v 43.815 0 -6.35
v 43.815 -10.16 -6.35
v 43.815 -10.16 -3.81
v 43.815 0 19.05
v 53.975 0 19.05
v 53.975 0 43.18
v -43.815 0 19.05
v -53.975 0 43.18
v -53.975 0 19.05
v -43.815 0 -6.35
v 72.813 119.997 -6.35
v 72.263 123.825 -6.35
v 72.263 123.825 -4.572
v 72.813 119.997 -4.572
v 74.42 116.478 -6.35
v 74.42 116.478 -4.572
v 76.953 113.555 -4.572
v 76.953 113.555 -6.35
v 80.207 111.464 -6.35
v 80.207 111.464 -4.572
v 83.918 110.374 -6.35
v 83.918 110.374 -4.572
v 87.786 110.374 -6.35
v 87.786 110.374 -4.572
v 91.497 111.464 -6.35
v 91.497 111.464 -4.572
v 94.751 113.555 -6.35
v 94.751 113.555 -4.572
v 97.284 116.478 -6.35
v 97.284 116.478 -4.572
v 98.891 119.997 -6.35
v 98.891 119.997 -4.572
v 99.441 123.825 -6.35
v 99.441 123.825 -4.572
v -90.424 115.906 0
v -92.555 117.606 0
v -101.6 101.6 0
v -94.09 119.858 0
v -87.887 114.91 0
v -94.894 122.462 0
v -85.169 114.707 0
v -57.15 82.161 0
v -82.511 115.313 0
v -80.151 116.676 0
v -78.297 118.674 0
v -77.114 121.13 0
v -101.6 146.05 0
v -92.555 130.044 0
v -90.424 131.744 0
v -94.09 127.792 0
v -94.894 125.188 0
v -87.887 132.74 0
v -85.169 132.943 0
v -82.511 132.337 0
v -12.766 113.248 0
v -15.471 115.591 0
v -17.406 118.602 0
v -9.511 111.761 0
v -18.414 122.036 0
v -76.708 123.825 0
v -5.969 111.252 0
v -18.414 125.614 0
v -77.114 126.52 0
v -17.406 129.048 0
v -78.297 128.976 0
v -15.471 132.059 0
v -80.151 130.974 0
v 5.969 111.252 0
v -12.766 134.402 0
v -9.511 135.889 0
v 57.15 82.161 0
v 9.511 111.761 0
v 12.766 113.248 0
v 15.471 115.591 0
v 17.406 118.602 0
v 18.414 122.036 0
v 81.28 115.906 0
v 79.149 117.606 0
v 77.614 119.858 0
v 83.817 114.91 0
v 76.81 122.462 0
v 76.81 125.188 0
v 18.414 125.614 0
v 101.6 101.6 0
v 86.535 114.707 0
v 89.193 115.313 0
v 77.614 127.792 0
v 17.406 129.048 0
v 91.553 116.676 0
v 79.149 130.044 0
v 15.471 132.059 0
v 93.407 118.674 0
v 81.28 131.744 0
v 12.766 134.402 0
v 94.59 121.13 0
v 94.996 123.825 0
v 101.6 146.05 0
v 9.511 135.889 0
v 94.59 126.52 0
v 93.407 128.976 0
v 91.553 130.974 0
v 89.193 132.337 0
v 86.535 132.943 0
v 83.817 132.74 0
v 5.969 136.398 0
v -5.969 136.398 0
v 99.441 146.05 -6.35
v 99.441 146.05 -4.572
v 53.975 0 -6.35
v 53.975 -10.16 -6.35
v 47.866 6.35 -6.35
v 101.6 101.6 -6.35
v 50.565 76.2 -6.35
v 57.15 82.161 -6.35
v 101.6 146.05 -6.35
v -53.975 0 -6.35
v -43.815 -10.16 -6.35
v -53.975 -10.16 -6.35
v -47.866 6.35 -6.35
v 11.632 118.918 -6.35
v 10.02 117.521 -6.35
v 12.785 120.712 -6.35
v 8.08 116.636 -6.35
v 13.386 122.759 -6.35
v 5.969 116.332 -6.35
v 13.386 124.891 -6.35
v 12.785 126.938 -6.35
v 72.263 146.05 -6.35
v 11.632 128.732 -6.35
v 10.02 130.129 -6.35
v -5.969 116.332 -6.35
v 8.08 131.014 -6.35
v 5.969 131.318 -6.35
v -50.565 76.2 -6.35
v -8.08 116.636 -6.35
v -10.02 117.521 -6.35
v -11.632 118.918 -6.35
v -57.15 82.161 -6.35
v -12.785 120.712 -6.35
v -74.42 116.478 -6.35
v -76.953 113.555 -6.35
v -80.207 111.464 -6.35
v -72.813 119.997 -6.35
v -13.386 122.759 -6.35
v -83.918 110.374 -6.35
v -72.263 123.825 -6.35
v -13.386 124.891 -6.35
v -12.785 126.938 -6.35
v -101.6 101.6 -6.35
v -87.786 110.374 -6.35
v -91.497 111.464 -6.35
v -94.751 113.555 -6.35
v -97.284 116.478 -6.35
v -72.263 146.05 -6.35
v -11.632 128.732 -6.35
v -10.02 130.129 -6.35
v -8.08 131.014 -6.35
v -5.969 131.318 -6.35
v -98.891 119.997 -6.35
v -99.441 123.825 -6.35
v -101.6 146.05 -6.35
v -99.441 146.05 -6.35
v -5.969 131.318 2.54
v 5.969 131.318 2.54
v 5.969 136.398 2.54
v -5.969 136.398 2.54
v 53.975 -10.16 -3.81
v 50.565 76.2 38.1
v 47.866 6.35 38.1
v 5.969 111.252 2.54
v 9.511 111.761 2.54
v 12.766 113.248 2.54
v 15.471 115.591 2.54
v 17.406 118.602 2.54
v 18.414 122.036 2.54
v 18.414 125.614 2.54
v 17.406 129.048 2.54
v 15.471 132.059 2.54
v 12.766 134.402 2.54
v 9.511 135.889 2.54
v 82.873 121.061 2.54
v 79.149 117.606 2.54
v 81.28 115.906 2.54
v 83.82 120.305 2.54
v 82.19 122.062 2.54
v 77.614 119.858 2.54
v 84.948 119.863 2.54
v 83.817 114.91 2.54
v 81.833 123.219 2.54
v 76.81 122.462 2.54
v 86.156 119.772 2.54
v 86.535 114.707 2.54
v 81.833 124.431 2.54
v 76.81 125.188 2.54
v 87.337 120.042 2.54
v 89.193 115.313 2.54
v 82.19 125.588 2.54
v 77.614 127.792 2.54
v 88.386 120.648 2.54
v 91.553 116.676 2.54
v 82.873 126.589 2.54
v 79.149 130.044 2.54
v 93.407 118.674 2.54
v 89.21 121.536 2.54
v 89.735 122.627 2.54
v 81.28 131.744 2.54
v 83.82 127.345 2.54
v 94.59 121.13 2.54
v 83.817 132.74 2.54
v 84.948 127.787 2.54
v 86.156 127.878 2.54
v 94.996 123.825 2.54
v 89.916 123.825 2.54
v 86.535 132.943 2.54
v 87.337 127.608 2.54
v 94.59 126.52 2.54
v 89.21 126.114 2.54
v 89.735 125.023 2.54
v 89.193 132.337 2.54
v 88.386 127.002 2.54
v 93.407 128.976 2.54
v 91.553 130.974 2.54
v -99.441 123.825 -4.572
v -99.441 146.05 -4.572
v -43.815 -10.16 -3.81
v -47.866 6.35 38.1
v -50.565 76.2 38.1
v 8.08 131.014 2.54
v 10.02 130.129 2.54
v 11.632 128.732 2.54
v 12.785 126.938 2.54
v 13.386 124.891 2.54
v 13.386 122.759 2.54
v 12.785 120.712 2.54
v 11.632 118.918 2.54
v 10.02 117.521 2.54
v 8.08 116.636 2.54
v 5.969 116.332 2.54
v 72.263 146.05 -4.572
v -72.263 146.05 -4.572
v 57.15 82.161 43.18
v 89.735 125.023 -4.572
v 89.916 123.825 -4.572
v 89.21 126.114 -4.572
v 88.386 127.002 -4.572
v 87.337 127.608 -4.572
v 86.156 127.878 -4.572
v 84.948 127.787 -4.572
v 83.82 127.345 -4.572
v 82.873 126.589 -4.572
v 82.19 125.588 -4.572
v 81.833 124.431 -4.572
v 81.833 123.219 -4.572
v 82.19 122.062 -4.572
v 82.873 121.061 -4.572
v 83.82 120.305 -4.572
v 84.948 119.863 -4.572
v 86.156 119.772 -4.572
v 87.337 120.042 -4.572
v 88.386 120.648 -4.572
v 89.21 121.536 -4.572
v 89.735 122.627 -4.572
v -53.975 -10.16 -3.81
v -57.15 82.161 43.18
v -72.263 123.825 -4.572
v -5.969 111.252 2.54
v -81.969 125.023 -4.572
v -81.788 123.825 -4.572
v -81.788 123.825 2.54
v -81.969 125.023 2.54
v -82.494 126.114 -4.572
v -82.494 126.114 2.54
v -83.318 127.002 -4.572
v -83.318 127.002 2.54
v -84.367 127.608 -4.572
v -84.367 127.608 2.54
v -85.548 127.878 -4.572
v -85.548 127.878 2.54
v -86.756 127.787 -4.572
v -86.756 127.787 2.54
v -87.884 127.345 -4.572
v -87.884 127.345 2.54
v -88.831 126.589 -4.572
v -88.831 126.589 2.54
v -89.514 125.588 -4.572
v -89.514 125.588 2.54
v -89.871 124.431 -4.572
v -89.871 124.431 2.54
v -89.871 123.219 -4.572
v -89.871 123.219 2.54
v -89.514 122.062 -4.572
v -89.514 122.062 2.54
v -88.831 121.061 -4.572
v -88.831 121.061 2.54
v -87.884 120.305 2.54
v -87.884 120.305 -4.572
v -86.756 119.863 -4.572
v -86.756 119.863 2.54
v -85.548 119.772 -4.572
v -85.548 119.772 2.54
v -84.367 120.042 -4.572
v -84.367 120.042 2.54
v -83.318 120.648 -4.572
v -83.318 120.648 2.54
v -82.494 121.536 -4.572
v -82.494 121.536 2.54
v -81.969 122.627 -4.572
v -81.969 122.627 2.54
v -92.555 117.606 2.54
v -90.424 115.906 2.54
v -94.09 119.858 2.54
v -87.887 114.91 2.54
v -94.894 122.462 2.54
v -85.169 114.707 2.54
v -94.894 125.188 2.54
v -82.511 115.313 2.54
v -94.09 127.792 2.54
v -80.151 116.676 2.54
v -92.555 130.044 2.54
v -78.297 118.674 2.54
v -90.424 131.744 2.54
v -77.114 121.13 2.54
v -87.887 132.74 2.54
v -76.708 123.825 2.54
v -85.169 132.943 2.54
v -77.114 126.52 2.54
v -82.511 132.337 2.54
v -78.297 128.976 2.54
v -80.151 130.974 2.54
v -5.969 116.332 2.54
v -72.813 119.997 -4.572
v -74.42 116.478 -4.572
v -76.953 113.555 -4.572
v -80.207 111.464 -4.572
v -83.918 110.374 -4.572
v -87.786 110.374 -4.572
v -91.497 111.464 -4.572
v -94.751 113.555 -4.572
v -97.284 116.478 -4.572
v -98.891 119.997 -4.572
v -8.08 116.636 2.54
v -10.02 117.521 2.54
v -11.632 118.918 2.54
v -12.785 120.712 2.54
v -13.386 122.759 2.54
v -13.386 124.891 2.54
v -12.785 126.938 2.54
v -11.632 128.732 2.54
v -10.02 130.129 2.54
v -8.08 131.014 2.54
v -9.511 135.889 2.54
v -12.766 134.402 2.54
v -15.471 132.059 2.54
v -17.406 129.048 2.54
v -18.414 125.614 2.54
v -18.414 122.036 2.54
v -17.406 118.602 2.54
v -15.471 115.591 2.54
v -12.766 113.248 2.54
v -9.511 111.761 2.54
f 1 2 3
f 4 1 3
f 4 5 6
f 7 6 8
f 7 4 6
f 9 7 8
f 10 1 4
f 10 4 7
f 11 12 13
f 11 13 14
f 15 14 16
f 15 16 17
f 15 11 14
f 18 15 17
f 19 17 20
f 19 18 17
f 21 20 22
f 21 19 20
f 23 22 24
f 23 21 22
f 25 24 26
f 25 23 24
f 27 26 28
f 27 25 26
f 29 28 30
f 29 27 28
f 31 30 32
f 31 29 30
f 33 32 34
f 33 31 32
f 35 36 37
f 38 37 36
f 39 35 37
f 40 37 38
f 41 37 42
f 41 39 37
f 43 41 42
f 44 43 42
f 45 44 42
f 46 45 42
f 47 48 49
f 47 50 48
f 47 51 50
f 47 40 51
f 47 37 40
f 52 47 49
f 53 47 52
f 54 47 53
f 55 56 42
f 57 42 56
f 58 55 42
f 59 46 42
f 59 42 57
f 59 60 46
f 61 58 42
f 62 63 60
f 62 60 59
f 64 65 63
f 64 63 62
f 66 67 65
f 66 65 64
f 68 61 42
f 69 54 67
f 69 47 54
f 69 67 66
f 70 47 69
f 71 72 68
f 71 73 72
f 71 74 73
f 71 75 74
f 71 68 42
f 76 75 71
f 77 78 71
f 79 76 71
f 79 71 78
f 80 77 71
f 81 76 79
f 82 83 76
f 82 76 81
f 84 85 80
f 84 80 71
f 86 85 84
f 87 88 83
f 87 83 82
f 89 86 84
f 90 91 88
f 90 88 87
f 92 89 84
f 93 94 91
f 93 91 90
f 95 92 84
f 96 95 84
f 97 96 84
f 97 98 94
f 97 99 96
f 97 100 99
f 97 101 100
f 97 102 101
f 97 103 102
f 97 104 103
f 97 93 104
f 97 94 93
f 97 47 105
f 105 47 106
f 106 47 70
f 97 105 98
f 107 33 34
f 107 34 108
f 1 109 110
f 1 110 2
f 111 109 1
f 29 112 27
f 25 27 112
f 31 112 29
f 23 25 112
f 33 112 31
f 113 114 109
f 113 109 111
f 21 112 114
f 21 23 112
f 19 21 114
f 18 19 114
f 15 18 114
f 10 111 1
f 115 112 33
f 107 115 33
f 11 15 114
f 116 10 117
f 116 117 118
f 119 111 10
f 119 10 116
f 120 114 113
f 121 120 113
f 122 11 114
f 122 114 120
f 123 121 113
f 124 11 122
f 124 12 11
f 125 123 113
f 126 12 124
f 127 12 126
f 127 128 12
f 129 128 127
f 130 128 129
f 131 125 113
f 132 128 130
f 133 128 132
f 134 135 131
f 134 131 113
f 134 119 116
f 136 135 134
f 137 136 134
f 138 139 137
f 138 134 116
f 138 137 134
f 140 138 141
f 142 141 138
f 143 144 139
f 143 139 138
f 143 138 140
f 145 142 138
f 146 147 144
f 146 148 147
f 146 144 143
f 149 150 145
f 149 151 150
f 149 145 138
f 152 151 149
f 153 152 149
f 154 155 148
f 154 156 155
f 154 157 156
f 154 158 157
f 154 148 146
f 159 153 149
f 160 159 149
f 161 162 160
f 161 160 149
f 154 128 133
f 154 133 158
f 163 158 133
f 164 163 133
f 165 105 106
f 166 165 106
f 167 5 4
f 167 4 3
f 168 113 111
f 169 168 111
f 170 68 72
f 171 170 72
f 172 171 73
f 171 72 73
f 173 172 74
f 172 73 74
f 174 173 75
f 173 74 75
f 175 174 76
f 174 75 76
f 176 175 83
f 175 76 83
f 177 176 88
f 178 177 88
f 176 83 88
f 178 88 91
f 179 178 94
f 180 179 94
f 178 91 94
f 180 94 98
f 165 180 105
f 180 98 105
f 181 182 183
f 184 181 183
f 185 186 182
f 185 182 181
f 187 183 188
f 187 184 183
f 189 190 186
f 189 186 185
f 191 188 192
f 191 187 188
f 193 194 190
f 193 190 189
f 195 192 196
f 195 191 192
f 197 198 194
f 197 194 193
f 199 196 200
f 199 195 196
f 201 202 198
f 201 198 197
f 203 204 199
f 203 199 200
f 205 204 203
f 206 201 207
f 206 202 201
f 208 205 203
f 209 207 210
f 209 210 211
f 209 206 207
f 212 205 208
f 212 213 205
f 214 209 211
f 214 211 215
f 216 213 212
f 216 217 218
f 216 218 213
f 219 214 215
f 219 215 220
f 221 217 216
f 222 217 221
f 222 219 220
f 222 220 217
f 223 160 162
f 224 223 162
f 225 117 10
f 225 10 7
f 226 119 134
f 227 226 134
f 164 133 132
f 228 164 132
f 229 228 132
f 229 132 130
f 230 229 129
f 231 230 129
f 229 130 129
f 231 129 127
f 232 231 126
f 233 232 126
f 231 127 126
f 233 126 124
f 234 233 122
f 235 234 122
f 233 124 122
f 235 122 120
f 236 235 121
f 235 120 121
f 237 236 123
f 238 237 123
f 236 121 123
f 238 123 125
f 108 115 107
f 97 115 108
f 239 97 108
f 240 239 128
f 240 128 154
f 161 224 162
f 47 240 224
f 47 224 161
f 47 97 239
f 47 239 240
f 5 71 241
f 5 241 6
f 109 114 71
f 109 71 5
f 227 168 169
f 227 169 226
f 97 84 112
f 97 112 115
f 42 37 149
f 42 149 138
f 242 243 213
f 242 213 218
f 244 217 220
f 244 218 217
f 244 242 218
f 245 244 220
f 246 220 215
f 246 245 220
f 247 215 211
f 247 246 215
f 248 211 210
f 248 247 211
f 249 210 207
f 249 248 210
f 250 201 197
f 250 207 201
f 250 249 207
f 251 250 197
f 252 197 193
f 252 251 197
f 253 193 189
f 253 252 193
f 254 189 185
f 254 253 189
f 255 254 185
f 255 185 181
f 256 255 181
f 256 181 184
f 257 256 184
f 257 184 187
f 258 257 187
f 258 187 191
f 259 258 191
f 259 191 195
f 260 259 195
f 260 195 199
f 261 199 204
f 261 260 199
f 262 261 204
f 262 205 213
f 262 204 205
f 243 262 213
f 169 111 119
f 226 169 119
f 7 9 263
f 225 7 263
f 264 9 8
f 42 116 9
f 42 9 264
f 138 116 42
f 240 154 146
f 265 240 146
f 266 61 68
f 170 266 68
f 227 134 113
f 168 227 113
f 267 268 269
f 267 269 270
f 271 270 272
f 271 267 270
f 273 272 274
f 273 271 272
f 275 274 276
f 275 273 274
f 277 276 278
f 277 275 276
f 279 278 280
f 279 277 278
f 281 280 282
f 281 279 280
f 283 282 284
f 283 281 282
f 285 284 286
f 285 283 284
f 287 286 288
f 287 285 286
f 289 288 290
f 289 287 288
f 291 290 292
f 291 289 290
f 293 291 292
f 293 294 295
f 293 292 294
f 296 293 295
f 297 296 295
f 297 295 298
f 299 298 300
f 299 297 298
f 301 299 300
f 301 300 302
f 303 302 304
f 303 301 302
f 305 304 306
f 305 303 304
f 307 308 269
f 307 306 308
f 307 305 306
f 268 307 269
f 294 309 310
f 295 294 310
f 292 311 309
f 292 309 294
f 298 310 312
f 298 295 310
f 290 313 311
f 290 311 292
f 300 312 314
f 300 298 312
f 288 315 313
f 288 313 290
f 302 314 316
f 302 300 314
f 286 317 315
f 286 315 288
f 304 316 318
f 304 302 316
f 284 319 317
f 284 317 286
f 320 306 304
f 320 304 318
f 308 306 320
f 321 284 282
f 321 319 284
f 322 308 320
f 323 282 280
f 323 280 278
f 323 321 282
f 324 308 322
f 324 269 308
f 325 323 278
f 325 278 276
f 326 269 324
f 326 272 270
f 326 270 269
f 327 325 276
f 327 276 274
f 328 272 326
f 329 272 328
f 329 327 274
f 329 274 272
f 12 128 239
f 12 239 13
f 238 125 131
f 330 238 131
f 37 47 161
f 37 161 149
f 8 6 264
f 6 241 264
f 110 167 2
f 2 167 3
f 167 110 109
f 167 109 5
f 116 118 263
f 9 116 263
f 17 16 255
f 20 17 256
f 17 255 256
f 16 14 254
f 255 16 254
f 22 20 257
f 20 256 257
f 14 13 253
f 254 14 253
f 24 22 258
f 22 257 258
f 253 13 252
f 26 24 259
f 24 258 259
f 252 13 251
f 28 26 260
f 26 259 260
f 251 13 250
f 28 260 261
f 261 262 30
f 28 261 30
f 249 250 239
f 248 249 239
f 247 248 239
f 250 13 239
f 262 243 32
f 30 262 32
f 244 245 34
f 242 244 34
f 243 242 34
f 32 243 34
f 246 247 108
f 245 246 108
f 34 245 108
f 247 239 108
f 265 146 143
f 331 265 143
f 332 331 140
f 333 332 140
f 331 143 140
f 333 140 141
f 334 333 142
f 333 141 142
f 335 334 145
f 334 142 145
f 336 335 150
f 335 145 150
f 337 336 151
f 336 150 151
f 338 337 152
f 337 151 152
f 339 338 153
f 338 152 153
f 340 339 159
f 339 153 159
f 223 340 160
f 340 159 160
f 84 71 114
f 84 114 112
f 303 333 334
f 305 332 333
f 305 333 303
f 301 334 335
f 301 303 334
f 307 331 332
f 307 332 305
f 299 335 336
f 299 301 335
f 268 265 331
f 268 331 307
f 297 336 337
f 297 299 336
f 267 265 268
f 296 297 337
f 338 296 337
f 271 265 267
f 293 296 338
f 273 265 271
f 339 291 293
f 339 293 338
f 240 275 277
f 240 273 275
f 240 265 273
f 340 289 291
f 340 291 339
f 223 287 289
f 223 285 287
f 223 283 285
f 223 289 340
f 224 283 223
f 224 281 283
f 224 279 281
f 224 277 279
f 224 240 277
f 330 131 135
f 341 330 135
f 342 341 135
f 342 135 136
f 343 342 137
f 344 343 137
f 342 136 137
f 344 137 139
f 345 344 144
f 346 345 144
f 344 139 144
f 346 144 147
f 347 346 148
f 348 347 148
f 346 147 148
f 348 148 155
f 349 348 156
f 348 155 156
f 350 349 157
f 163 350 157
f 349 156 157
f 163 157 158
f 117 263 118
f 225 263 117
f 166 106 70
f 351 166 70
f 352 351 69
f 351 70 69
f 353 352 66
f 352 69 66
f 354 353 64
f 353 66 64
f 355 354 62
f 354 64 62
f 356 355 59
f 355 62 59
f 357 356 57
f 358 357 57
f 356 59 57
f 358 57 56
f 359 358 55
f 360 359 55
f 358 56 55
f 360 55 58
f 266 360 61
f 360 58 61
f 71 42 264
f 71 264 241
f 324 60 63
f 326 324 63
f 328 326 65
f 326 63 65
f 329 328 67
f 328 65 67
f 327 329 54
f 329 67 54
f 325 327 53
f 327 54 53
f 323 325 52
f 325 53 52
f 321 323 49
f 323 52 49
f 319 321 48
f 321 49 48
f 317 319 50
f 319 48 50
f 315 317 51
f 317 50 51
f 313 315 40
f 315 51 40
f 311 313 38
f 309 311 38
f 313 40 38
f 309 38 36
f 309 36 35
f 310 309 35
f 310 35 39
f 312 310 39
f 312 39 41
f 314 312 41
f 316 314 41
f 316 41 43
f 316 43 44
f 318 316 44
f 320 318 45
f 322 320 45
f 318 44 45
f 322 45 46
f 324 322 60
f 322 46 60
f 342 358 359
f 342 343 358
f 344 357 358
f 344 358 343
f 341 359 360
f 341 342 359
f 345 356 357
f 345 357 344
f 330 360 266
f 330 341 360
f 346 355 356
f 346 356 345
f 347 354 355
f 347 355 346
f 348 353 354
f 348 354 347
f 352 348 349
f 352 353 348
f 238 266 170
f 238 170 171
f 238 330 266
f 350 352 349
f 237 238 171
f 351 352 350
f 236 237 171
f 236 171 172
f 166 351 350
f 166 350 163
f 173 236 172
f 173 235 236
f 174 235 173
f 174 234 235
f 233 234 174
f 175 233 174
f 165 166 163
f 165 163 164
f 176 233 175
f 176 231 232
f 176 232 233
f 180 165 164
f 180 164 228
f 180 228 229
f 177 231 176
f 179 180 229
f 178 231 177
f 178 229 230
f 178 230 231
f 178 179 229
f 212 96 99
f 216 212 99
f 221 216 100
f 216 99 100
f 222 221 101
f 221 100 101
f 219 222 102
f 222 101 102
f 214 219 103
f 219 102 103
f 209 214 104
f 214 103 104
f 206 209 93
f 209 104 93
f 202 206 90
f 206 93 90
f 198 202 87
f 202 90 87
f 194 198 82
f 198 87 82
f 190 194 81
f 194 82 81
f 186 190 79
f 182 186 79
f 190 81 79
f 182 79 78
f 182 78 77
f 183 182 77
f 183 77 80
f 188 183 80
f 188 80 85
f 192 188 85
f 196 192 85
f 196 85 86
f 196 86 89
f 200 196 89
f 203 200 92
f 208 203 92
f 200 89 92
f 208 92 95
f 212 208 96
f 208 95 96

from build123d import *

# Parameters (mm, degrees)
MAIN_BODY_DEPTH                    = 6.35
POCKET_OUTER_SURFACE_DEPTH         = 43.18
POCKET_INSIDE_DEPTH                = 44.45
SKETCH8_W                          = 10.16
SKETCH8_H                          = 25.4
BOTTOM_SCREW_MOUNT_DEPTH           = 10.16
BOTTOM_SCREW_MOUNT_EXTRUSION_DEPTH = 10.16
LIGHT_SOCKETS_DEPTH                = 184.078329957
LIGHT_SOCKETS_DEPTH_BACK           = 6.35
SKETCH17_R                         = 4.064
SKETCH18_R                         = 9.144
LIGHT_LIP_LINERS_DEPTH             = 2.54
LIGHT_LIP_SOCKETS_REACH            = 185.078
SKETCH17_2_R                       = 4.064
TAB_SLOTS_DEPTH                    = 1.778


# Sheet-metal steps are written as plain solids
with BuildPart() as part:
    # Sketch1 → Main Body (new body)
    with BuildSketch(Plane.XY):
        Polygon((-53.975, 0), (53.975, 0), (57.15, 82.161327118), (101.6, 101.6), (101.6, 146.05), (-101.6, 146.05), (-101.6, 101.6), (-57.15, 82.161327118), align=None)
    extrude(amount=-MAIN_BODY_DEPTH)

    # Sketch6 → Pocket-Outer Surface (add)
    with BuildSketch(Plane.XY):
        Polygon((53.975, 0), (-53.975, 0), (-57.15, 82.161327118), (57.15, 82.161327118), align=None)
    extrude(amount=POCKET_OUTER_SURFACE_DEPTH)

    # Sketch7 → Pocket-Inside (cut)
    with BuildSketch(Plane(origin=(0, 0, -6.35), x_dir=(-1, 0, 0), z_dir=(0, 0, -1))):
        Polygon((-50.564894027, 76.2), (-47.86564661, 6.35), (47.86564661, 6.35), (50.564894027, 76.2), align=None)
    extrude(amount=-POCKET_INSIDE_DEPTH, mode=Mode.SUBTRACT)

    # Sketch8 → Bottom Screw Mount (add)
    with BuildSketch(Plane.XZ):
        with Locations((-48.895, 6.35)):
            Rectangle(SKETCH8_W, SKETCH8_H)
    bottom_screw_mount = extrude(amount=BOTTOM_SCREW_MOUNT_DEPTH)

    # Sketch9 → Bottom Screw Mount Extrusion (cut)
    with BuildSketch(Plane.ZY.offset(53.975)):
        Polygon((-3.81, -10.16), (19.05, -10.16), (19.05, 0), align=None)
    bottom_screw_mount_extrusion = extrude(amount=-BOTTOM_SCREW_MOUNT_EXTRUSION_DEPTH, mode=Mode.SUBTRACT)

    # Left Bottom Screw Mount: Bottom Screw Mount, Bottom Screw Mount Extrusion across plane
    add(bottom_screw_mount.mirror(Plane(origin=(0, 0, 0), x_dir=(0, 0, 1), z_dir=(1, 0, 0))))
    add(bottom_screw_mount_extrusion.mirror(Plane(origin=(0, 0, 0), x_dir=(0, 0, 1), z_dir=(1, 0, 0))), mode=Mode.SUBTRACT)

    # Sketch17 → Light Sockets (cut, two sides: drawn at the far end of the back side and taken through both)
    with BuildSketch(Plane.XY.offset(-LIGHT_SOCKETS_DEPTH_BACK)):
        with Locations((85.852, 123.825)):
            Circle(SKETCH17_R)
        with Locations((-85.852, 123.825)):
            Circle(SKETCH17_R)
        with BuildLine():
            Line((-5.969, 131.318), (5.969, 131.318))
            ThreePointArc((5.969, 131.318), (13.462, 123.825), (5.969, 116.332))
            Line((5.969, 116.332), (-5.969, 116.332))
            ThreePointArc((-5.969, 116.332), (-13.462, 123.825), (-5.969, 131.318))
        make_face()
    extrude(amount=LIGHT_SOCKETS_DEPTH + LIGHT_SOCKETS_DEPTH_BACK, mode=Mode.SUBTRACT)

    # Sketch18 → Light Lip Liners (add)
    with BuildSketch(Plane.XY):
        with Locations((-85.852, 123.825)):
            Circle(SKETCH18_R)
        with Locations((85.852, 123.825)):
            Circle(SKETCH18_R)
        with BuildLine():
            Line((5.969, 136.398), (-5.969, 136.398))
            ThreePointArc((-5.969, 136.398), (-18.542, 123.825), (-5.969, 111.252))
            Line((-5.969, 111.252), (5.969, 111.252))
            ThreePointArc((5.969, 111.252), (18.542, 123.825), (5.969, 136.398))
        make_face()
    extrude(amount=LIGHT_LIP_LINERS_DEPTH)

    # Sketch17<2> → Light Lip Sockets (cut, up to next)
    with BuildSketch(Plane.XY, mode=Mode.PRIVATE) as light_lip_sockets_sk1:
        with Locations((85.852, 123.825)):
            Circle(SKETCH17_2_R)
    light_lip_sockets_tool1 = extrude(light_lip_sockets_sk1.sketch, amount=LIGHT_LIP_SOCKETS_REACH, mode=Mode.PRIVATE) & part.part
    # Sketch17<2> → Light Lip Sockets (cut, up to next)
    with BuildSketch(Plane.XY, mode=Mode.PRIVATE) as light_lip_sockets_sk2:
        with Locations((-85.852, 123.825)):
            Circle(SKETCH17_2_R)
    light_lip_sockets_tool2 = extrude(light_lip_sockets_sk2.sketch, amount=LIGHT_LIP_SOCKETS_REACH, mode=Mode.PRIVATE) & part.part
    # Sketch17<2> → Light Lip Sockets (cut, up to next)
    with BuildSketch(Plane.XY, mode=Mode.PRIVATE) as light_lip_sockets_sk3:
        with BuildLine():
            Line((-5.969, 131.318), (5.969, 131.318))
            ThreePointArc((5.969, 131.318), (13.462, 123.825), (5.969, 116.332))
            Line((5.969, 116.332), (-5.969, 116.332))
            ThreePointArc((-5.969, 116.332), (-13.462, 123.825), (-5.969, 131.318))
        make_face()
    light_lip_sockets_tool3 = extrude(light_lip_sockets_sk3.sketch, amount=LIGHT_LIP_SOCKETS_REACH, mode=Mode.PRIVATE) & part.part
    add(light_lip_sockets_tool1.solids().sort_by_distance((85.852, 123.825, 0))[0], mode=Mode.SUBTRACT)
    add(light_lip_sockets_tool2.solids().sort_by_distance((-85.852, 123.825, 0))[0], mode=Mode.SUBTRACT)
    add(light_lip_sockets_tool3.solids().sort_by_distance((0, 123.825, 0))[0], mode=Mode.SUBTRACT)

    # Sketch19 → Tab Slots (cut)
    with BuildSketch(Plane(origin=(0, 0, -6.35), x_dir=(-1, 0, 0), z_dir=(0, 0, -1))):
        with BuildLine():
            Line((72.263, 146.05), (72.263, 123.825))
            ThreePointArc((72.263, 123.825), (85.852, 110.236), (99.441, 123.825))
            Line((99.441, 123.825), (99.441, 146.05))
            Line((99.441, 146.05), (72.263, 146.05))
        make_face()
    tab_slots = extrude(amount=-TAB_SLOTS_DEPTH, mode=Mode.SUBTRACT)

    # Mirror3: Tab Slots across plane
    add(tab_slots.mirror(Plane(origin=(0, 0, 0), x_dir=(0, 0, 1), z_dir=(1, 0, 0))), mode=Mode.SUBTRACT)


solid = part.part
